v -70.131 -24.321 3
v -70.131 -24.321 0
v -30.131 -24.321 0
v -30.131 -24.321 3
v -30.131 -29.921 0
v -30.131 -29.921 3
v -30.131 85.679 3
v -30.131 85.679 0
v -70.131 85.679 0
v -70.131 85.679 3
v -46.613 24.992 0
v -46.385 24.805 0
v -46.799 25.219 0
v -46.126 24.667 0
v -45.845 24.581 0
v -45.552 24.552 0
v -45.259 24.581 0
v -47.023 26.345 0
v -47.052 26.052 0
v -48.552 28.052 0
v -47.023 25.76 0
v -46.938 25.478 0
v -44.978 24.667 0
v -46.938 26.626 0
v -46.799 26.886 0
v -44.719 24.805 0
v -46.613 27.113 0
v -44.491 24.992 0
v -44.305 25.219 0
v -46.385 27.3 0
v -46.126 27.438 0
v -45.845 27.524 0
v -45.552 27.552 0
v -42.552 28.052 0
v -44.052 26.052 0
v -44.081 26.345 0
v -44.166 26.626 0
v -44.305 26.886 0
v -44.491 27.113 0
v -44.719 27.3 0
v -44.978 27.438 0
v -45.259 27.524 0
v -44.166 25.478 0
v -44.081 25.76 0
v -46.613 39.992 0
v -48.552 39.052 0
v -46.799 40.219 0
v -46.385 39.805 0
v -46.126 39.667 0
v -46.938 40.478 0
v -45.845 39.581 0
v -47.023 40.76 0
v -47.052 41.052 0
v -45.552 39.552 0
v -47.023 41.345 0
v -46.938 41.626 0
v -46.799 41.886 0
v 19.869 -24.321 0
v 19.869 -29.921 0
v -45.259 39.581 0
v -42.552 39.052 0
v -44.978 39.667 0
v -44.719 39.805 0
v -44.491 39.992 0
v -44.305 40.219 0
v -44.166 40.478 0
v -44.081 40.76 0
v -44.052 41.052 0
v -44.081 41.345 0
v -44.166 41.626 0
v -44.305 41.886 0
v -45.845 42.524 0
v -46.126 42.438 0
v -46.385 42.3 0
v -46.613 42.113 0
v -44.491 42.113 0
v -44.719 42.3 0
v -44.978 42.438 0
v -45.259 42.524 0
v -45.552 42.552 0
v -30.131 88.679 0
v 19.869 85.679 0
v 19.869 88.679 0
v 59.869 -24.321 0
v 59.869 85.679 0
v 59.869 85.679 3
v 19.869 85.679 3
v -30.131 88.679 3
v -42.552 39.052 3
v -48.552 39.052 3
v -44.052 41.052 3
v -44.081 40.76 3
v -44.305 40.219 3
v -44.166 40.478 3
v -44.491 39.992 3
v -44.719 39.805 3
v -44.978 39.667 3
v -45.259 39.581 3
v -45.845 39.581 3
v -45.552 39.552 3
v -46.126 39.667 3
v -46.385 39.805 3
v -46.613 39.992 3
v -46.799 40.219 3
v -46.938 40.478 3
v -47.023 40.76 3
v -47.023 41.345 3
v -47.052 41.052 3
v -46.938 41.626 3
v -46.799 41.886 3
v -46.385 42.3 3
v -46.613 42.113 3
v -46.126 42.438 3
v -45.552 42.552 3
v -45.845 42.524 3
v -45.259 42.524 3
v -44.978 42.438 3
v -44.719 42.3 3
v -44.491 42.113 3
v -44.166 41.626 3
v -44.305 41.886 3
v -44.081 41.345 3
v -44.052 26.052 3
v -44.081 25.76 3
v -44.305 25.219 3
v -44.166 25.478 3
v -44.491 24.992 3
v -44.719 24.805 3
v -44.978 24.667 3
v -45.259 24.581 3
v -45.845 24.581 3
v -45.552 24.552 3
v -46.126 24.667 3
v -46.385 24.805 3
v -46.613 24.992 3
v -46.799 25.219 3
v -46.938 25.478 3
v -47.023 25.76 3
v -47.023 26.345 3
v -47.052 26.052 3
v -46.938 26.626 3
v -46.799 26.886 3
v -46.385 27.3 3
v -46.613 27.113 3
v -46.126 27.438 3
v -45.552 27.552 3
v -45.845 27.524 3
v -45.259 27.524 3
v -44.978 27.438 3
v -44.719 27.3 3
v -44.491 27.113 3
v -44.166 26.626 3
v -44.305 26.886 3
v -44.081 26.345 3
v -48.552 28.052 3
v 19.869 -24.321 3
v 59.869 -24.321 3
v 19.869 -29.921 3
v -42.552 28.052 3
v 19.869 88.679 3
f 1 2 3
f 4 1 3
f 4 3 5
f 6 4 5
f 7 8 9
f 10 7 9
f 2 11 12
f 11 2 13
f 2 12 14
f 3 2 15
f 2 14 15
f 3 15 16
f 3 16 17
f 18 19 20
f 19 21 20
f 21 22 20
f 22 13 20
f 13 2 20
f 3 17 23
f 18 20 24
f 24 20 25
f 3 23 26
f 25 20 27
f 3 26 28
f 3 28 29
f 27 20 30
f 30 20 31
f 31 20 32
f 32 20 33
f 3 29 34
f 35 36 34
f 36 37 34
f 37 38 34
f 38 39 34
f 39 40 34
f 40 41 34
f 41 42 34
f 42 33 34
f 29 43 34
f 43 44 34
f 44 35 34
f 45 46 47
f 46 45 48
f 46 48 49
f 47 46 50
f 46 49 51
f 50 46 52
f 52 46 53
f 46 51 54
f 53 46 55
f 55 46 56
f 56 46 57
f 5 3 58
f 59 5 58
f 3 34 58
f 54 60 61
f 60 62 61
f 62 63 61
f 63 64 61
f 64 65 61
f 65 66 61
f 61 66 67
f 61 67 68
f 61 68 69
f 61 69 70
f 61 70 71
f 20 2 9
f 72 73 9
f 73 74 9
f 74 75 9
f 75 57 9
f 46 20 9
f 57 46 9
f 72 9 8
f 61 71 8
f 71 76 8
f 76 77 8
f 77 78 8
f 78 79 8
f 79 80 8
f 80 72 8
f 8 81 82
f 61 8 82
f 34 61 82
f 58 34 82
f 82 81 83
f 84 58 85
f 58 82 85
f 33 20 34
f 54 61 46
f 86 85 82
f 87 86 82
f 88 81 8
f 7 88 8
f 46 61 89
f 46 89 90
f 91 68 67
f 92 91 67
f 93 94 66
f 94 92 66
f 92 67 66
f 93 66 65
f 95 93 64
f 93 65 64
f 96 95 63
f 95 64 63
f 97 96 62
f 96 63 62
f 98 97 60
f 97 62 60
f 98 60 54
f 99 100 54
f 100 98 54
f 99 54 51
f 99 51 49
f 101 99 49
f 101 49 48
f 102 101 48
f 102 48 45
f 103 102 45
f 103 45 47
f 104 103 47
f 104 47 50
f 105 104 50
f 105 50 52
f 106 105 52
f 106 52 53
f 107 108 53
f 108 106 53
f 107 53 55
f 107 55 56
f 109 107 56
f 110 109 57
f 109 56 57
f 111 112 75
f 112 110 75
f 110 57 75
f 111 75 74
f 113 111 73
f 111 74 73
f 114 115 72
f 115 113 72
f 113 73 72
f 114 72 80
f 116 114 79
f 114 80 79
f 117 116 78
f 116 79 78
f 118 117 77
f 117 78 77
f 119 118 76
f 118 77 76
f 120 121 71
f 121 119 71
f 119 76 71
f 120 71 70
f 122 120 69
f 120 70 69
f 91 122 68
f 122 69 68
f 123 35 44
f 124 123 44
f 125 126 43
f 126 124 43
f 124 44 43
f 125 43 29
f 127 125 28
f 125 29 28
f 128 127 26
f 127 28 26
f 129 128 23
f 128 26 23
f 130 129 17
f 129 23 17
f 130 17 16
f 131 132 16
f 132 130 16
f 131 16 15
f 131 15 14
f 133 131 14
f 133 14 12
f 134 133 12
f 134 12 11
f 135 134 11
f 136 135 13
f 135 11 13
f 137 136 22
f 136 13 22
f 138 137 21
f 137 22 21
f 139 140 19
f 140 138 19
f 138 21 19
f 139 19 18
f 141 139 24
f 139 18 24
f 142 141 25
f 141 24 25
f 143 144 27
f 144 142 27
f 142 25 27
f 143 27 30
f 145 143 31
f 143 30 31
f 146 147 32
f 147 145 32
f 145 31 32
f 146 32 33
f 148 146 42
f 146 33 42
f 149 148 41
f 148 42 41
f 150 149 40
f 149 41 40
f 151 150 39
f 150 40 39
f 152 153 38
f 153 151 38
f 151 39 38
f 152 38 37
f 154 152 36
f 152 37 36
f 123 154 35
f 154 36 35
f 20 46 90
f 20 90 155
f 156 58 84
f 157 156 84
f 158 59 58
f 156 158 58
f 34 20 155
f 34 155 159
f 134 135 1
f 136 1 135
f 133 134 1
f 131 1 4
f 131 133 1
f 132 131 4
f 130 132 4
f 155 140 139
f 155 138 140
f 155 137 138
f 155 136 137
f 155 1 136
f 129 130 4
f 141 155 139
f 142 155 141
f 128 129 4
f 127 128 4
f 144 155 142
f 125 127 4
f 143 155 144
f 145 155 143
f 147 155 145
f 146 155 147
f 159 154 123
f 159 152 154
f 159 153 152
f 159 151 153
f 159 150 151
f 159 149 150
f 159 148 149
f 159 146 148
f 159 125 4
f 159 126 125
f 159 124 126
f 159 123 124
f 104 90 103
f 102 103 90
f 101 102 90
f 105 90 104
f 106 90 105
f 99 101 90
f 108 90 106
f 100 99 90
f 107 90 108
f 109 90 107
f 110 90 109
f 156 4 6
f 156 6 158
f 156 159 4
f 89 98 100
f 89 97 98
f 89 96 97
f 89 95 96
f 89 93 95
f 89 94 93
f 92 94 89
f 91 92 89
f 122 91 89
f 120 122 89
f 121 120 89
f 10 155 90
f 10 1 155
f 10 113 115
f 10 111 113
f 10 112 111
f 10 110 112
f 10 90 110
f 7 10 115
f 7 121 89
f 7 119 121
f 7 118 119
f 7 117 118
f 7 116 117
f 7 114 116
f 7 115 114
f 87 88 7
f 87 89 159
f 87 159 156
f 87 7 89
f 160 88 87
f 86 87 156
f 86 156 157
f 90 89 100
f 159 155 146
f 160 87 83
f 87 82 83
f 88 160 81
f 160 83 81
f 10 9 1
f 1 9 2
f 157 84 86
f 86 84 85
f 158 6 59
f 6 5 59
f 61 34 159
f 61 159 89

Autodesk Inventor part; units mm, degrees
ref_plane "YZ Plane" through (0, 0, 0) normal (1, 0, 0) x (0, 1, 0)
ref_plane "XZ Plane" through (0, 0, 0) normal (0, 1, 0) x (-1, 0, 0)
ref_plane "XY Plane" through (0, 0, 0) normal (0, 0, 1) x (1, 0, 0)
sketch "Sketch1" plane through (0, 0, 0) normal (0, 0, 1) x (1, 0, 0)
  line L0 (-70.131, 85.6788) -> (-70.131, -24.3212)
  line L1 (-70.131, -24.3212) -> (-30.131, -24.3212)
  line L2 (-30.131, -24.3212) -> (-30.131, -29.9212)
  line L3 (-30.131, -29.9212) -> (19.869, -29.9212)
  line L4 (19.869, -29.9212) -> (19.869, -24.3212)
  line L5 (19.869, -24.3212) -> (59.869, -24.3212)
  line L6 (59.869, -24.3212) -> (59.869, 85.6788)
  line L7 (59.869, 85.6788) -> (19.869, 85.6788)
  line L8 (19.869, 85.6788) -> (19.869, 88.6788)
  line L9 (19.869, 88.6788) -> (-30.131, 88.6788)
  line L10 (-30.131, 88.6788) -> (-30.131, 85.6788)
  line L11 (-30.131, 85.6788) -> (-70.131, 85.6788)
  line L12 (-5.131, 88.6788) -> (-5.131, -29.9212) construction
  line L13 (-48.5521, 39.0524) -> (-48.5521, 28.0524)
  line L14 (-48.5521, 28.0524) -> (-42.5521, 28.0524)
  line L15 (-42.5521, 28.0524) -> (-42.5521, 39.0524)
  line L16 (-42.5521, 39.0524) -> (-48.5521, 39.0524)
  circle A0 centre (-45.5521, 41.0524) radius 1.5
  circle A1 centre (-45.5521, 26.0524) radius 1.5
  line L17 (-45.5521, 26.0524) -> (-45.5521, 41.0524) construction
  point P0 (0, 0)
  dimension "d0" = 130
  dimension "d1" = 110
  dimension "d2" = 50
  dimension "d3" = 50
  dimension "d4" = 11
  dimension "d5" = 6
  dimension "d6" = 3
  dimension "d7" = 2
  dimension "d8" = 3
  dimension "d9" = 2
  dimension "d12" = 3
  dimension "d13" = 5.6
extrude "Extrusion1" add sketch "Sketch1" along normal blind 3
properties part number "BackWallV2"
